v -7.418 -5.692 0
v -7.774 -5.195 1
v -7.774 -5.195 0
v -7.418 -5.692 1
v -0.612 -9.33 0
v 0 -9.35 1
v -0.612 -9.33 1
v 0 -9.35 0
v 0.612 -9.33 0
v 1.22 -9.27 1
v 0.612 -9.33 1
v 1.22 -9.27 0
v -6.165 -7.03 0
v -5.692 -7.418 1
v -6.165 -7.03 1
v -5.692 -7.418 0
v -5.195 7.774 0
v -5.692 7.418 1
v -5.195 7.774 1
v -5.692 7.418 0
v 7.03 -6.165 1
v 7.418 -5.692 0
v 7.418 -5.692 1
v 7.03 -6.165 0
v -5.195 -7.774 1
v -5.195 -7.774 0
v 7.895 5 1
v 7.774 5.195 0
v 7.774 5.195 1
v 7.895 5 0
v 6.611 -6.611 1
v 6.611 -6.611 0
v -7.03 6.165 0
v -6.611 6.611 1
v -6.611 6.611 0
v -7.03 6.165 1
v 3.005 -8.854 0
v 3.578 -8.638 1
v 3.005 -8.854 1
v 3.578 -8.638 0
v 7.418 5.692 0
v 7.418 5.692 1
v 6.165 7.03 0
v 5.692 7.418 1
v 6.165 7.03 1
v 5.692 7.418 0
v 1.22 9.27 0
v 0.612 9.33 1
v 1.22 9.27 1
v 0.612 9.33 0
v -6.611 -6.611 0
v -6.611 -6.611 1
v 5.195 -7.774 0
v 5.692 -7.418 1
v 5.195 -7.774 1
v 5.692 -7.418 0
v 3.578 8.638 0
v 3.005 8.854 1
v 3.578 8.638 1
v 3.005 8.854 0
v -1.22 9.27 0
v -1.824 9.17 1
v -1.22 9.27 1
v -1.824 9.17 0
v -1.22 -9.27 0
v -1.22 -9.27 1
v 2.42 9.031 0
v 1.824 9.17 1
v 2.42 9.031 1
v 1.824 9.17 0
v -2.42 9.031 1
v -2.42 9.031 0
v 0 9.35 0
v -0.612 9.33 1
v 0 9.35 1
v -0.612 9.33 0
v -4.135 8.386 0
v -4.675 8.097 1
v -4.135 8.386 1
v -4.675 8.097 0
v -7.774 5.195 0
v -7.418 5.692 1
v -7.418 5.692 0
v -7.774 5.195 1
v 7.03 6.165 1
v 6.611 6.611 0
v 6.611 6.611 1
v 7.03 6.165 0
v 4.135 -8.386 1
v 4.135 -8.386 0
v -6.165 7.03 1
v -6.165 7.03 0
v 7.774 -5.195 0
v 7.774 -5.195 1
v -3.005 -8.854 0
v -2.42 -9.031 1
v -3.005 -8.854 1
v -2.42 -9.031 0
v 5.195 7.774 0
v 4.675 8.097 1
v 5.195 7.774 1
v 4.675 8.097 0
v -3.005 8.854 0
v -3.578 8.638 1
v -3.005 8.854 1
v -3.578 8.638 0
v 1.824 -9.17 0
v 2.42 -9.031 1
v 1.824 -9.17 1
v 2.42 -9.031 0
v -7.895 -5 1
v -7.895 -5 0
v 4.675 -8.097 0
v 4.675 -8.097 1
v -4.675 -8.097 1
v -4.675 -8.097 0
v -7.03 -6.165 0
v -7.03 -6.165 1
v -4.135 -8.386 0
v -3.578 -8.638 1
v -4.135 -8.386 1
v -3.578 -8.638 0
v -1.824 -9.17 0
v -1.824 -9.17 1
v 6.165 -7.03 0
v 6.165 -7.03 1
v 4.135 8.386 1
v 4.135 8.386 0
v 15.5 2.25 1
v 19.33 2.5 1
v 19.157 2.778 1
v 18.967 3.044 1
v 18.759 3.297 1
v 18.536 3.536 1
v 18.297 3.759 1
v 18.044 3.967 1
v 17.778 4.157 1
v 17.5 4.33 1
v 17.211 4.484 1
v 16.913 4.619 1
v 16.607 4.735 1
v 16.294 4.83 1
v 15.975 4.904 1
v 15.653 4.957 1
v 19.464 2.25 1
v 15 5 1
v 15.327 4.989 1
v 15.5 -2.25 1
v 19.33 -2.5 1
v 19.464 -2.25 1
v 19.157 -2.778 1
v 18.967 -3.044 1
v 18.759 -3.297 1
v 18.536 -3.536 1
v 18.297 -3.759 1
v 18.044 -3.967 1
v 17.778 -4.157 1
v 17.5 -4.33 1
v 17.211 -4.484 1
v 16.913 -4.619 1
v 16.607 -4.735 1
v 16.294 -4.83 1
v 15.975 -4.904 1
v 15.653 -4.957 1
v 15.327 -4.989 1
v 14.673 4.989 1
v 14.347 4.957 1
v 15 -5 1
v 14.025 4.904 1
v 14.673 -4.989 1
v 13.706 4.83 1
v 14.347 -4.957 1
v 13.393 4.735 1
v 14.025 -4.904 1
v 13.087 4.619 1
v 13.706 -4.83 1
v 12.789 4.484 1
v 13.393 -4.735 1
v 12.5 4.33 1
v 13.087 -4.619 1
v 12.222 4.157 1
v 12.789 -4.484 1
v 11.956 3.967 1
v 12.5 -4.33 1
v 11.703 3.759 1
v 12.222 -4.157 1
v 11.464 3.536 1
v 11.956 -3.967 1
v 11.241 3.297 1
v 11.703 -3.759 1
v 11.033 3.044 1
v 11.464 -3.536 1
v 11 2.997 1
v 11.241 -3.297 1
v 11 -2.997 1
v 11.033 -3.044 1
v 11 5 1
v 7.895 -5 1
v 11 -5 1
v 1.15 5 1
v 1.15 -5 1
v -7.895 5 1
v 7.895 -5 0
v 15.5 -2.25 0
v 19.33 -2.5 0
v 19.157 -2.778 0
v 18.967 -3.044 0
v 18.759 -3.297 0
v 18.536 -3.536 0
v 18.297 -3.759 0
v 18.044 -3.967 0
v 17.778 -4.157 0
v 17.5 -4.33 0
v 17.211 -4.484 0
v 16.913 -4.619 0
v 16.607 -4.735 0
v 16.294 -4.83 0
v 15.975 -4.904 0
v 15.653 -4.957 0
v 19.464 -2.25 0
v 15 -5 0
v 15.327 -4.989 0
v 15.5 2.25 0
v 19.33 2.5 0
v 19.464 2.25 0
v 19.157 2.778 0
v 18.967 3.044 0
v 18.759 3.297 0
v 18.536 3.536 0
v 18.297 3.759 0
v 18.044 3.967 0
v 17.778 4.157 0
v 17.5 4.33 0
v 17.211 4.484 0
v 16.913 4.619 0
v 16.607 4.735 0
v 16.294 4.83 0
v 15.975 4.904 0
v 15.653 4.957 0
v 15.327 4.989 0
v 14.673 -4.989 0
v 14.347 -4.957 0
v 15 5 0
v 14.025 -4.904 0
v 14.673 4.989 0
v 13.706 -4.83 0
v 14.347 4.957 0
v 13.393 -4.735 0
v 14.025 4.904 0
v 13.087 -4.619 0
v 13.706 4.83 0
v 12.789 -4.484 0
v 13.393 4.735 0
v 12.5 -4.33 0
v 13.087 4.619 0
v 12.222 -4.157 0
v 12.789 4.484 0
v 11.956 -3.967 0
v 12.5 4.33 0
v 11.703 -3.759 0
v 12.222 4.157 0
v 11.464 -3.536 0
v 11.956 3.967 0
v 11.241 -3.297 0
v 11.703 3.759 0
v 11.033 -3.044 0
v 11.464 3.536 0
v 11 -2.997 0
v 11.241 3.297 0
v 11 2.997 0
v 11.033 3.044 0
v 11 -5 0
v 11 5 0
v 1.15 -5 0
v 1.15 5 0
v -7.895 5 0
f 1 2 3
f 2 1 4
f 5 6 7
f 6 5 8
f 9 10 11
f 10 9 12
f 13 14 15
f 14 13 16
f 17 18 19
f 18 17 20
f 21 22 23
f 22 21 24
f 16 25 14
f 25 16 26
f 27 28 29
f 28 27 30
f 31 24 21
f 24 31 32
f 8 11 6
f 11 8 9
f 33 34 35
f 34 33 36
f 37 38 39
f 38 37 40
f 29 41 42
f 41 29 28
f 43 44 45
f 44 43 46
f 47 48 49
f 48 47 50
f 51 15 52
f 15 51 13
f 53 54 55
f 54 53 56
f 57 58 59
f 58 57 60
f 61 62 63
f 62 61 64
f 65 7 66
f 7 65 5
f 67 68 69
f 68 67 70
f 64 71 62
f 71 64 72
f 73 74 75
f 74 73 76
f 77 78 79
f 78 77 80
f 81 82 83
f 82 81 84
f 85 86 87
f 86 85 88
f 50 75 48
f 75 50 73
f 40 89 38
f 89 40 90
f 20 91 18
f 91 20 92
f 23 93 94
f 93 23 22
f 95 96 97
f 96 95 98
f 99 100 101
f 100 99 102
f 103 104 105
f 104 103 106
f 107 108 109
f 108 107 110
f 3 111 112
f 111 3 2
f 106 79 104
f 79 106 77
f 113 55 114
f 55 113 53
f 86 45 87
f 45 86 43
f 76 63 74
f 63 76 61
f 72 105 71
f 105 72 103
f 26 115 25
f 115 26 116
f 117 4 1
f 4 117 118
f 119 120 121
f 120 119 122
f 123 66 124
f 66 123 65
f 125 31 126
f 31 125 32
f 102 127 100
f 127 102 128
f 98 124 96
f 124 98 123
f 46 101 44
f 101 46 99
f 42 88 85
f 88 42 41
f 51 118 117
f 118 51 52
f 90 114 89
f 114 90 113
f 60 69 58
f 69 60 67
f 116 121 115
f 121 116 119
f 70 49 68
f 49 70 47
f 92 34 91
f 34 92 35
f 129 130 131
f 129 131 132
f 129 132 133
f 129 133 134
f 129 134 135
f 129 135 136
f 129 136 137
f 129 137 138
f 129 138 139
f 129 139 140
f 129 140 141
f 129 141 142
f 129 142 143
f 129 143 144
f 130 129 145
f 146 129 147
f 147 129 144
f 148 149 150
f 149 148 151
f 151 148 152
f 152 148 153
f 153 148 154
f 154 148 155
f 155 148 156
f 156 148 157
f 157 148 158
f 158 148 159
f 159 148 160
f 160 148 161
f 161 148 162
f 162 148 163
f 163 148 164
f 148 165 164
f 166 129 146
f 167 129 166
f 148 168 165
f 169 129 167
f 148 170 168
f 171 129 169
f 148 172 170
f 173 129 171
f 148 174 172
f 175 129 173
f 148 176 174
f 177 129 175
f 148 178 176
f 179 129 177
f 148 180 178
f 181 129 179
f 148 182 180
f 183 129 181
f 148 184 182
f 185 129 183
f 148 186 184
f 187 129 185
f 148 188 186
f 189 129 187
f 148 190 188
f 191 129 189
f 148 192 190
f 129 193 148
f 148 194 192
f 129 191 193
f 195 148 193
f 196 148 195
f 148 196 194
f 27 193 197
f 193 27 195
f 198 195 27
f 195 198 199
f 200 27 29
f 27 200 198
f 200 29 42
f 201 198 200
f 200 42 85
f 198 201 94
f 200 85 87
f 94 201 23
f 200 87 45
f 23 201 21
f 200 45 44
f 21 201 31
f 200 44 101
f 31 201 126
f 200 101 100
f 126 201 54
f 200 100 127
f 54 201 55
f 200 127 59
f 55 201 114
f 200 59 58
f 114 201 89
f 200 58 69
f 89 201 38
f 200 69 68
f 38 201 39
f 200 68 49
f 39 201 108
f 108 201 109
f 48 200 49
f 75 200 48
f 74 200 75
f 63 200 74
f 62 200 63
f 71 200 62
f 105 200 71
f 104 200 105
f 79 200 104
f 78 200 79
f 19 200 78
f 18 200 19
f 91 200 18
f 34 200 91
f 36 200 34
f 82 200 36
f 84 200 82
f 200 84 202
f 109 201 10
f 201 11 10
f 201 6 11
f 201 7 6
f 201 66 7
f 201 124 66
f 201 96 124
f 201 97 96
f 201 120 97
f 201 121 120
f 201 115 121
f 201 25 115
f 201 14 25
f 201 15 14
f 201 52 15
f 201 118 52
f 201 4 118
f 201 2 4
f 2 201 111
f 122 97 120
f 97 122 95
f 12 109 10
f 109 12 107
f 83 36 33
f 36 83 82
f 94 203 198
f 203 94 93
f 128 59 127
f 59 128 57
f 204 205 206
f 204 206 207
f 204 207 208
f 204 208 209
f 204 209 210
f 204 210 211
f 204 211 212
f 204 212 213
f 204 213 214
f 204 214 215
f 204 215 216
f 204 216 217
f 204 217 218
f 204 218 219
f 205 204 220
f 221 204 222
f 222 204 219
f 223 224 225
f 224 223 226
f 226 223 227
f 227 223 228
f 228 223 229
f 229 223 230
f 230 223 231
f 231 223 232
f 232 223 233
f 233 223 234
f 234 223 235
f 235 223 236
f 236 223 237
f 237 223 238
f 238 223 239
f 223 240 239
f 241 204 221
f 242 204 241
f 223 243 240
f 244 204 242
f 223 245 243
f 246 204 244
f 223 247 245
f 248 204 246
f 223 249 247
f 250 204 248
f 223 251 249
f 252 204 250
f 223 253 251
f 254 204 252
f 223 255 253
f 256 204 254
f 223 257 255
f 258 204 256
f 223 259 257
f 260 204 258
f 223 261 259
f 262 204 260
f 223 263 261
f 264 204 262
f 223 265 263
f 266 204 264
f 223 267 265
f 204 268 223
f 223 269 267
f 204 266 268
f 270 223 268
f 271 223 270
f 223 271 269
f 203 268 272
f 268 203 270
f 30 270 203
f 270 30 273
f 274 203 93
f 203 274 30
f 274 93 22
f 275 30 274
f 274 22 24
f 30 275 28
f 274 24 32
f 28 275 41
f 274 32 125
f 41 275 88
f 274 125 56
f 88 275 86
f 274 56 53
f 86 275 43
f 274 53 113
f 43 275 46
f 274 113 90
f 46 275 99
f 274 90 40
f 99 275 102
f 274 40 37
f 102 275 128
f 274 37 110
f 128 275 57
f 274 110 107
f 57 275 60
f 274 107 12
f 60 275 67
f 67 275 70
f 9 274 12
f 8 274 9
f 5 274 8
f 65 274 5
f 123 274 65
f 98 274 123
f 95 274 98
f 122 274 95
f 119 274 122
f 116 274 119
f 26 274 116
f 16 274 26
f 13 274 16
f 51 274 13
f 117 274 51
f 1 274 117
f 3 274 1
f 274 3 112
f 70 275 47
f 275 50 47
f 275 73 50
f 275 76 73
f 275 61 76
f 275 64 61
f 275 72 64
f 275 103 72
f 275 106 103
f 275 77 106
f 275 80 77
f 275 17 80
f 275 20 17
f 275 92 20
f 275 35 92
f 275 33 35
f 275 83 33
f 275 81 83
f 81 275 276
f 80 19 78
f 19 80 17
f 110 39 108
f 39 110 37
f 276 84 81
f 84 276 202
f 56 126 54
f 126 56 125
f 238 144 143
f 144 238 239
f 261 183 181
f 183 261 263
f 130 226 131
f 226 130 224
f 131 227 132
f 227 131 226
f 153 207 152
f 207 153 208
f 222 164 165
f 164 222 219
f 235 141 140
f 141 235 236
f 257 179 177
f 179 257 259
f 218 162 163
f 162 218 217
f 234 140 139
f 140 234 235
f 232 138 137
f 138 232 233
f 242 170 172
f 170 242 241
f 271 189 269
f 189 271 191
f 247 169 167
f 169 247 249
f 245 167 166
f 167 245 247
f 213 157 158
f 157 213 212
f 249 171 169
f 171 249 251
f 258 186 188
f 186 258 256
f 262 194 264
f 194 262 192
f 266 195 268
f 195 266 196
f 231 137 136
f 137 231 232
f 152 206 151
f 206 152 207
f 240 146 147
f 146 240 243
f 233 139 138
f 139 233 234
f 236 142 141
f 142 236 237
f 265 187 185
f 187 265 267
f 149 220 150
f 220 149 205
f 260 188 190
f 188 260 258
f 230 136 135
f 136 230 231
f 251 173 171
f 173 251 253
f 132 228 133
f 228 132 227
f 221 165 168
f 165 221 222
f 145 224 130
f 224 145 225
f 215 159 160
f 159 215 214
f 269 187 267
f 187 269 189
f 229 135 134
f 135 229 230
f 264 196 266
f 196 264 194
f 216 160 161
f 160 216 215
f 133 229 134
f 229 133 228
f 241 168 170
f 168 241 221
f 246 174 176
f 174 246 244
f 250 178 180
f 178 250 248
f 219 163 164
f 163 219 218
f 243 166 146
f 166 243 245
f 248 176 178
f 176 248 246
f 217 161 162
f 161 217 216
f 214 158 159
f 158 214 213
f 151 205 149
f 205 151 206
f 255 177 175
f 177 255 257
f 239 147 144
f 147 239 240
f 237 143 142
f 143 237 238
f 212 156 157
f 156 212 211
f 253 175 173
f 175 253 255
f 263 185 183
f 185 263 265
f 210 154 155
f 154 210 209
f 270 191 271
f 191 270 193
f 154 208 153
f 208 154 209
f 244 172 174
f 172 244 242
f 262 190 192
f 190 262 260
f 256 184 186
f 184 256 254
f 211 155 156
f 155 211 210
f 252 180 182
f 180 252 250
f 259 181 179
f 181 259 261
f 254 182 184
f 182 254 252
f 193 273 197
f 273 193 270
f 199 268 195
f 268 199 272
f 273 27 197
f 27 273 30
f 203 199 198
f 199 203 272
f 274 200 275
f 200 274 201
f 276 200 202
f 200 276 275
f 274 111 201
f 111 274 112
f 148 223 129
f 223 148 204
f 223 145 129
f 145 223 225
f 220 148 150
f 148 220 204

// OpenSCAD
// Snap-on tubing clip for a 12.7 mm (1/2 inch) lab stand rod
// Print orientation: flat on bed, extruded along +Z

$fn = 96;

// ---- Dimensions (mm) ----
rod_id     = 12.7;   // rod inner diameter
rod_wall   = 3;      // rod ring wall thickness
rod_od     = rod_id + 2 * rod_wall;  // rod ring outer diameter (18.7)

tubing_id  = 6;      // tubing inner diameter
tubing_wall = 2;     // tubing ring wall thickness
tubing_od  = tubing_id + 2 * tubing_wall;  // tubing ring outer diameter (10)

bridge_w   = 6;      // bridge width along X (x = 8 to x = 12)
bridge_h   = 10;     // bridge height along Y

opening_rod = 10;    // rod ring opening width (-X side)
opening_tub  = 4.5;  // tubing ring opening width (+X side)

eps        = 0.5;    // cutter overshoot

// ---- Profile ----
difference() {
    union() {
        // Rod ring
        cylinder(d = rod_od, h = 1);
        // Tubing ring
        translate([15, 0]) cylinder(d = tubing_od, h = 1);
        // Bridge
        translate([8 - bridge_w / 2, -bridge_h / 2])
            cube([bridge_w, bridge_h, 1]);
    }
    // Rod ring opening (x < 0, -5 < y < 5)
    translate([-rod_od / 2 - eps, -opening_rod / 2, 0])
        cube([opening_rod + 2 * eps, opening_rod, 1]);
    // Tubing ring opening (x > 15, -2.25 < y < 2.25)
    translate([15 + eps, -opening_tub / 2, 0])
        cube([opening_tub + 2 * eps, opening_tub, 1]);
}
